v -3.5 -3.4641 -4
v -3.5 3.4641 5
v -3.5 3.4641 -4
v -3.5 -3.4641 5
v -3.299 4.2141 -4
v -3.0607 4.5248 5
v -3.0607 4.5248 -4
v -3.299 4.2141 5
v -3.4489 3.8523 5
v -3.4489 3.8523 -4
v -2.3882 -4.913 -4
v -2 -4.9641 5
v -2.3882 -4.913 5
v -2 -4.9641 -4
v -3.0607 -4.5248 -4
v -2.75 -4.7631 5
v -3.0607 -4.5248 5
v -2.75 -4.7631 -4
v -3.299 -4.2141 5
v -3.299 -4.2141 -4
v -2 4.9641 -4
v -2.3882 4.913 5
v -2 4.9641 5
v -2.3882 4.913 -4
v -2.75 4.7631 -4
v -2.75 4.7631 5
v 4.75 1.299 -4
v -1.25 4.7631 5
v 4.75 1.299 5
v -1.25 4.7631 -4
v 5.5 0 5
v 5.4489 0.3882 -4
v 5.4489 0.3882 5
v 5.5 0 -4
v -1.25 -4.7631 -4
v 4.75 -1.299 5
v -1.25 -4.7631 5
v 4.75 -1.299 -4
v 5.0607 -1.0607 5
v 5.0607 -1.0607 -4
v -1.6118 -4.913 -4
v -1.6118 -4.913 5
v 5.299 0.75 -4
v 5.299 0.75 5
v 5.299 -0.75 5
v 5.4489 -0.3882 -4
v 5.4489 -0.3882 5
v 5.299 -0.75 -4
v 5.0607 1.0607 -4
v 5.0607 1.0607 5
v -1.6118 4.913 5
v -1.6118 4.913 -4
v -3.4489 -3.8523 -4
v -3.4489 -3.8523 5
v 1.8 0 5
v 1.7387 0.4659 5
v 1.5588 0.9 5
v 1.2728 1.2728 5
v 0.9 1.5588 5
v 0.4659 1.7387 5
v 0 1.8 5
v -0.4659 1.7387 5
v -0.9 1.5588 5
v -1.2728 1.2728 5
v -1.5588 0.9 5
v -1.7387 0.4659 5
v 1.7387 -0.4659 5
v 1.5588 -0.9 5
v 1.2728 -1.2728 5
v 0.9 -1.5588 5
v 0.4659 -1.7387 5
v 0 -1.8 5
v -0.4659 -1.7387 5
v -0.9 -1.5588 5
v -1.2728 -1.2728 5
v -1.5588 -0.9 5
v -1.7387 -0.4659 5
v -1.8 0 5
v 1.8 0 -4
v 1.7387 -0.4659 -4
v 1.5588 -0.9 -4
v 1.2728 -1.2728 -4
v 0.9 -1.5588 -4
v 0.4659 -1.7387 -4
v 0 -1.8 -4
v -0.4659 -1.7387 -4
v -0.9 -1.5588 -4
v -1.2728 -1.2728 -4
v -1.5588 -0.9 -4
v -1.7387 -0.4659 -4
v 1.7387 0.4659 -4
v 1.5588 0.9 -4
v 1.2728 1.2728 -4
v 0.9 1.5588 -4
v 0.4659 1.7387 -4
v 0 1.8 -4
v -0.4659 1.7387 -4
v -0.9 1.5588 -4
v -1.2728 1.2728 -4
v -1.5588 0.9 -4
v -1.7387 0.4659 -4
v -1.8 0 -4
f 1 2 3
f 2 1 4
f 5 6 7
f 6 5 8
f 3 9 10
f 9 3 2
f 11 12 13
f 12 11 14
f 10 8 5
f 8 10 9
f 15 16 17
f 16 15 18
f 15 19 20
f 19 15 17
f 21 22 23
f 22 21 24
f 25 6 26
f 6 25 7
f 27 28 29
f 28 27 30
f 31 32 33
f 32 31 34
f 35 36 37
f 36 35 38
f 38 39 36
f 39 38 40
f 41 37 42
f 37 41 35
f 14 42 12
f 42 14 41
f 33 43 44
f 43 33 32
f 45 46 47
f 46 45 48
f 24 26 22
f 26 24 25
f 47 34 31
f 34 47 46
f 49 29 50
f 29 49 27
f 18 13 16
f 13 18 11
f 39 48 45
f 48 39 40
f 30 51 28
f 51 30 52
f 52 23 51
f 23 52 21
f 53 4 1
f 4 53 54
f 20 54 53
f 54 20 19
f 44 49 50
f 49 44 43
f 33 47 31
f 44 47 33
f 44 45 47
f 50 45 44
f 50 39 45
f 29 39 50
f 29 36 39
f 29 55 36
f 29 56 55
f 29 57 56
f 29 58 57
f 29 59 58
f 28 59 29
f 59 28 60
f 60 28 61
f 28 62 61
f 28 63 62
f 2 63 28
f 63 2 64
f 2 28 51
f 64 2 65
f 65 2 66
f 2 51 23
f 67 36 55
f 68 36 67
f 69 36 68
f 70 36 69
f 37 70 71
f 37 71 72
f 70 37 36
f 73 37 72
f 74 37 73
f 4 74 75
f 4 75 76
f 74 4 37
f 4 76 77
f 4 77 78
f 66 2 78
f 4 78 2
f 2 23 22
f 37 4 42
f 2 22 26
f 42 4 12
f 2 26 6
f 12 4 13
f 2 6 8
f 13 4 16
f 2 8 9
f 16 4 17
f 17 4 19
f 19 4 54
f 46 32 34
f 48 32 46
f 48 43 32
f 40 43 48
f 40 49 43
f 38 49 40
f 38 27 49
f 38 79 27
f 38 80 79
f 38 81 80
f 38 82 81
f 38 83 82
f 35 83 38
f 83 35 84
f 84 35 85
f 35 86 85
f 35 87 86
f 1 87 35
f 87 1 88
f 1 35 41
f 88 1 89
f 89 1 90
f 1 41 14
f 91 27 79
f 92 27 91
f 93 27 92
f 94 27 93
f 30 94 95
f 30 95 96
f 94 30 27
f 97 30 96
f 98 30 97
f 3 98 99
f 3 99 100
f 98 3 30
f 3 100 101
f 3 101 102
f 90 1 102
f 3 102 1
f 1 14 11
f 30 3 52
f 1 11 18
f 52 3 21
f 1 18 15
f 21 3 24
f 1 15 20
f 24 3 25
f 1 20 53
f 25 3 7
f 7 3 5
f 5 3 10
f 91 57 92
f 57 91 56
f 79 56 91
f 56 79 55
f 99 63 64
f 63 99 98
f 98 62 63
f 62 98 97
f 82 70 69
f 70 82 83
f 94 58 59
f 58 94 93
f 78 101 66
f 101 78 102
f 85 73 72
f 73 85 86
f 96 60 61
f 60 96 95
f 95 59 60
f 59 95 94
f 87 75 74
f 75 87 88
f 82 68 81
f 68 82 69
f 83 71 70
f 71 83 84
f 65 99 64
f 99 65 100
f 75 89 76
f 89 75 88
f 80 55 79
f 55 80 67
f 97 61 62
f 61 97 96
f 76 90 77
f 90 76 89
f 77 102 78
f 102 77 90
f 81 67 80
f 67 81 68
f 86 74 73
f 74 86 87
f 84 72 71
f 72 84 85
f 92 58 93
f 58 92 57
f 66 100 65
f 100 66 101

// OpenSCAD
// Christmas star

// Copyright (C) 2016 Embecosm Limited (www.embecosm.com)

// Contributor: Jeremy Bennett <jeremy.bennett@embecosm.com>

// This file is licensed under the Creative Commons Attribution-ShareAlike 3.0
// Unported License. To view a copy of this license, visit
// http://creativecommons.org/licenses/by-sa/3.0/ or send a letter to Creative
// Commons, PO Box 1866, Mountain View, CA 94042, USA.


// A star of David incorporating a Cuttlefish. This is the generic half

HOLE_R = 1.8;
HEAD_R = 3.5;
SPACER_H = 8;

DELTA = 0.1;

module spacer () {
    difference () {
        minkowski () {
            cylinder (r = 4, h = SPACER_H, $fn = 3, center = true);
            cylinder (r = 1.5, $fn = 24);
        }
        cylinder (r = HOLE_R, h = SPACER_H +1.5 * 2 + DELTA, $fn = 24,
                  center = true);
    }
}

spacer ();
